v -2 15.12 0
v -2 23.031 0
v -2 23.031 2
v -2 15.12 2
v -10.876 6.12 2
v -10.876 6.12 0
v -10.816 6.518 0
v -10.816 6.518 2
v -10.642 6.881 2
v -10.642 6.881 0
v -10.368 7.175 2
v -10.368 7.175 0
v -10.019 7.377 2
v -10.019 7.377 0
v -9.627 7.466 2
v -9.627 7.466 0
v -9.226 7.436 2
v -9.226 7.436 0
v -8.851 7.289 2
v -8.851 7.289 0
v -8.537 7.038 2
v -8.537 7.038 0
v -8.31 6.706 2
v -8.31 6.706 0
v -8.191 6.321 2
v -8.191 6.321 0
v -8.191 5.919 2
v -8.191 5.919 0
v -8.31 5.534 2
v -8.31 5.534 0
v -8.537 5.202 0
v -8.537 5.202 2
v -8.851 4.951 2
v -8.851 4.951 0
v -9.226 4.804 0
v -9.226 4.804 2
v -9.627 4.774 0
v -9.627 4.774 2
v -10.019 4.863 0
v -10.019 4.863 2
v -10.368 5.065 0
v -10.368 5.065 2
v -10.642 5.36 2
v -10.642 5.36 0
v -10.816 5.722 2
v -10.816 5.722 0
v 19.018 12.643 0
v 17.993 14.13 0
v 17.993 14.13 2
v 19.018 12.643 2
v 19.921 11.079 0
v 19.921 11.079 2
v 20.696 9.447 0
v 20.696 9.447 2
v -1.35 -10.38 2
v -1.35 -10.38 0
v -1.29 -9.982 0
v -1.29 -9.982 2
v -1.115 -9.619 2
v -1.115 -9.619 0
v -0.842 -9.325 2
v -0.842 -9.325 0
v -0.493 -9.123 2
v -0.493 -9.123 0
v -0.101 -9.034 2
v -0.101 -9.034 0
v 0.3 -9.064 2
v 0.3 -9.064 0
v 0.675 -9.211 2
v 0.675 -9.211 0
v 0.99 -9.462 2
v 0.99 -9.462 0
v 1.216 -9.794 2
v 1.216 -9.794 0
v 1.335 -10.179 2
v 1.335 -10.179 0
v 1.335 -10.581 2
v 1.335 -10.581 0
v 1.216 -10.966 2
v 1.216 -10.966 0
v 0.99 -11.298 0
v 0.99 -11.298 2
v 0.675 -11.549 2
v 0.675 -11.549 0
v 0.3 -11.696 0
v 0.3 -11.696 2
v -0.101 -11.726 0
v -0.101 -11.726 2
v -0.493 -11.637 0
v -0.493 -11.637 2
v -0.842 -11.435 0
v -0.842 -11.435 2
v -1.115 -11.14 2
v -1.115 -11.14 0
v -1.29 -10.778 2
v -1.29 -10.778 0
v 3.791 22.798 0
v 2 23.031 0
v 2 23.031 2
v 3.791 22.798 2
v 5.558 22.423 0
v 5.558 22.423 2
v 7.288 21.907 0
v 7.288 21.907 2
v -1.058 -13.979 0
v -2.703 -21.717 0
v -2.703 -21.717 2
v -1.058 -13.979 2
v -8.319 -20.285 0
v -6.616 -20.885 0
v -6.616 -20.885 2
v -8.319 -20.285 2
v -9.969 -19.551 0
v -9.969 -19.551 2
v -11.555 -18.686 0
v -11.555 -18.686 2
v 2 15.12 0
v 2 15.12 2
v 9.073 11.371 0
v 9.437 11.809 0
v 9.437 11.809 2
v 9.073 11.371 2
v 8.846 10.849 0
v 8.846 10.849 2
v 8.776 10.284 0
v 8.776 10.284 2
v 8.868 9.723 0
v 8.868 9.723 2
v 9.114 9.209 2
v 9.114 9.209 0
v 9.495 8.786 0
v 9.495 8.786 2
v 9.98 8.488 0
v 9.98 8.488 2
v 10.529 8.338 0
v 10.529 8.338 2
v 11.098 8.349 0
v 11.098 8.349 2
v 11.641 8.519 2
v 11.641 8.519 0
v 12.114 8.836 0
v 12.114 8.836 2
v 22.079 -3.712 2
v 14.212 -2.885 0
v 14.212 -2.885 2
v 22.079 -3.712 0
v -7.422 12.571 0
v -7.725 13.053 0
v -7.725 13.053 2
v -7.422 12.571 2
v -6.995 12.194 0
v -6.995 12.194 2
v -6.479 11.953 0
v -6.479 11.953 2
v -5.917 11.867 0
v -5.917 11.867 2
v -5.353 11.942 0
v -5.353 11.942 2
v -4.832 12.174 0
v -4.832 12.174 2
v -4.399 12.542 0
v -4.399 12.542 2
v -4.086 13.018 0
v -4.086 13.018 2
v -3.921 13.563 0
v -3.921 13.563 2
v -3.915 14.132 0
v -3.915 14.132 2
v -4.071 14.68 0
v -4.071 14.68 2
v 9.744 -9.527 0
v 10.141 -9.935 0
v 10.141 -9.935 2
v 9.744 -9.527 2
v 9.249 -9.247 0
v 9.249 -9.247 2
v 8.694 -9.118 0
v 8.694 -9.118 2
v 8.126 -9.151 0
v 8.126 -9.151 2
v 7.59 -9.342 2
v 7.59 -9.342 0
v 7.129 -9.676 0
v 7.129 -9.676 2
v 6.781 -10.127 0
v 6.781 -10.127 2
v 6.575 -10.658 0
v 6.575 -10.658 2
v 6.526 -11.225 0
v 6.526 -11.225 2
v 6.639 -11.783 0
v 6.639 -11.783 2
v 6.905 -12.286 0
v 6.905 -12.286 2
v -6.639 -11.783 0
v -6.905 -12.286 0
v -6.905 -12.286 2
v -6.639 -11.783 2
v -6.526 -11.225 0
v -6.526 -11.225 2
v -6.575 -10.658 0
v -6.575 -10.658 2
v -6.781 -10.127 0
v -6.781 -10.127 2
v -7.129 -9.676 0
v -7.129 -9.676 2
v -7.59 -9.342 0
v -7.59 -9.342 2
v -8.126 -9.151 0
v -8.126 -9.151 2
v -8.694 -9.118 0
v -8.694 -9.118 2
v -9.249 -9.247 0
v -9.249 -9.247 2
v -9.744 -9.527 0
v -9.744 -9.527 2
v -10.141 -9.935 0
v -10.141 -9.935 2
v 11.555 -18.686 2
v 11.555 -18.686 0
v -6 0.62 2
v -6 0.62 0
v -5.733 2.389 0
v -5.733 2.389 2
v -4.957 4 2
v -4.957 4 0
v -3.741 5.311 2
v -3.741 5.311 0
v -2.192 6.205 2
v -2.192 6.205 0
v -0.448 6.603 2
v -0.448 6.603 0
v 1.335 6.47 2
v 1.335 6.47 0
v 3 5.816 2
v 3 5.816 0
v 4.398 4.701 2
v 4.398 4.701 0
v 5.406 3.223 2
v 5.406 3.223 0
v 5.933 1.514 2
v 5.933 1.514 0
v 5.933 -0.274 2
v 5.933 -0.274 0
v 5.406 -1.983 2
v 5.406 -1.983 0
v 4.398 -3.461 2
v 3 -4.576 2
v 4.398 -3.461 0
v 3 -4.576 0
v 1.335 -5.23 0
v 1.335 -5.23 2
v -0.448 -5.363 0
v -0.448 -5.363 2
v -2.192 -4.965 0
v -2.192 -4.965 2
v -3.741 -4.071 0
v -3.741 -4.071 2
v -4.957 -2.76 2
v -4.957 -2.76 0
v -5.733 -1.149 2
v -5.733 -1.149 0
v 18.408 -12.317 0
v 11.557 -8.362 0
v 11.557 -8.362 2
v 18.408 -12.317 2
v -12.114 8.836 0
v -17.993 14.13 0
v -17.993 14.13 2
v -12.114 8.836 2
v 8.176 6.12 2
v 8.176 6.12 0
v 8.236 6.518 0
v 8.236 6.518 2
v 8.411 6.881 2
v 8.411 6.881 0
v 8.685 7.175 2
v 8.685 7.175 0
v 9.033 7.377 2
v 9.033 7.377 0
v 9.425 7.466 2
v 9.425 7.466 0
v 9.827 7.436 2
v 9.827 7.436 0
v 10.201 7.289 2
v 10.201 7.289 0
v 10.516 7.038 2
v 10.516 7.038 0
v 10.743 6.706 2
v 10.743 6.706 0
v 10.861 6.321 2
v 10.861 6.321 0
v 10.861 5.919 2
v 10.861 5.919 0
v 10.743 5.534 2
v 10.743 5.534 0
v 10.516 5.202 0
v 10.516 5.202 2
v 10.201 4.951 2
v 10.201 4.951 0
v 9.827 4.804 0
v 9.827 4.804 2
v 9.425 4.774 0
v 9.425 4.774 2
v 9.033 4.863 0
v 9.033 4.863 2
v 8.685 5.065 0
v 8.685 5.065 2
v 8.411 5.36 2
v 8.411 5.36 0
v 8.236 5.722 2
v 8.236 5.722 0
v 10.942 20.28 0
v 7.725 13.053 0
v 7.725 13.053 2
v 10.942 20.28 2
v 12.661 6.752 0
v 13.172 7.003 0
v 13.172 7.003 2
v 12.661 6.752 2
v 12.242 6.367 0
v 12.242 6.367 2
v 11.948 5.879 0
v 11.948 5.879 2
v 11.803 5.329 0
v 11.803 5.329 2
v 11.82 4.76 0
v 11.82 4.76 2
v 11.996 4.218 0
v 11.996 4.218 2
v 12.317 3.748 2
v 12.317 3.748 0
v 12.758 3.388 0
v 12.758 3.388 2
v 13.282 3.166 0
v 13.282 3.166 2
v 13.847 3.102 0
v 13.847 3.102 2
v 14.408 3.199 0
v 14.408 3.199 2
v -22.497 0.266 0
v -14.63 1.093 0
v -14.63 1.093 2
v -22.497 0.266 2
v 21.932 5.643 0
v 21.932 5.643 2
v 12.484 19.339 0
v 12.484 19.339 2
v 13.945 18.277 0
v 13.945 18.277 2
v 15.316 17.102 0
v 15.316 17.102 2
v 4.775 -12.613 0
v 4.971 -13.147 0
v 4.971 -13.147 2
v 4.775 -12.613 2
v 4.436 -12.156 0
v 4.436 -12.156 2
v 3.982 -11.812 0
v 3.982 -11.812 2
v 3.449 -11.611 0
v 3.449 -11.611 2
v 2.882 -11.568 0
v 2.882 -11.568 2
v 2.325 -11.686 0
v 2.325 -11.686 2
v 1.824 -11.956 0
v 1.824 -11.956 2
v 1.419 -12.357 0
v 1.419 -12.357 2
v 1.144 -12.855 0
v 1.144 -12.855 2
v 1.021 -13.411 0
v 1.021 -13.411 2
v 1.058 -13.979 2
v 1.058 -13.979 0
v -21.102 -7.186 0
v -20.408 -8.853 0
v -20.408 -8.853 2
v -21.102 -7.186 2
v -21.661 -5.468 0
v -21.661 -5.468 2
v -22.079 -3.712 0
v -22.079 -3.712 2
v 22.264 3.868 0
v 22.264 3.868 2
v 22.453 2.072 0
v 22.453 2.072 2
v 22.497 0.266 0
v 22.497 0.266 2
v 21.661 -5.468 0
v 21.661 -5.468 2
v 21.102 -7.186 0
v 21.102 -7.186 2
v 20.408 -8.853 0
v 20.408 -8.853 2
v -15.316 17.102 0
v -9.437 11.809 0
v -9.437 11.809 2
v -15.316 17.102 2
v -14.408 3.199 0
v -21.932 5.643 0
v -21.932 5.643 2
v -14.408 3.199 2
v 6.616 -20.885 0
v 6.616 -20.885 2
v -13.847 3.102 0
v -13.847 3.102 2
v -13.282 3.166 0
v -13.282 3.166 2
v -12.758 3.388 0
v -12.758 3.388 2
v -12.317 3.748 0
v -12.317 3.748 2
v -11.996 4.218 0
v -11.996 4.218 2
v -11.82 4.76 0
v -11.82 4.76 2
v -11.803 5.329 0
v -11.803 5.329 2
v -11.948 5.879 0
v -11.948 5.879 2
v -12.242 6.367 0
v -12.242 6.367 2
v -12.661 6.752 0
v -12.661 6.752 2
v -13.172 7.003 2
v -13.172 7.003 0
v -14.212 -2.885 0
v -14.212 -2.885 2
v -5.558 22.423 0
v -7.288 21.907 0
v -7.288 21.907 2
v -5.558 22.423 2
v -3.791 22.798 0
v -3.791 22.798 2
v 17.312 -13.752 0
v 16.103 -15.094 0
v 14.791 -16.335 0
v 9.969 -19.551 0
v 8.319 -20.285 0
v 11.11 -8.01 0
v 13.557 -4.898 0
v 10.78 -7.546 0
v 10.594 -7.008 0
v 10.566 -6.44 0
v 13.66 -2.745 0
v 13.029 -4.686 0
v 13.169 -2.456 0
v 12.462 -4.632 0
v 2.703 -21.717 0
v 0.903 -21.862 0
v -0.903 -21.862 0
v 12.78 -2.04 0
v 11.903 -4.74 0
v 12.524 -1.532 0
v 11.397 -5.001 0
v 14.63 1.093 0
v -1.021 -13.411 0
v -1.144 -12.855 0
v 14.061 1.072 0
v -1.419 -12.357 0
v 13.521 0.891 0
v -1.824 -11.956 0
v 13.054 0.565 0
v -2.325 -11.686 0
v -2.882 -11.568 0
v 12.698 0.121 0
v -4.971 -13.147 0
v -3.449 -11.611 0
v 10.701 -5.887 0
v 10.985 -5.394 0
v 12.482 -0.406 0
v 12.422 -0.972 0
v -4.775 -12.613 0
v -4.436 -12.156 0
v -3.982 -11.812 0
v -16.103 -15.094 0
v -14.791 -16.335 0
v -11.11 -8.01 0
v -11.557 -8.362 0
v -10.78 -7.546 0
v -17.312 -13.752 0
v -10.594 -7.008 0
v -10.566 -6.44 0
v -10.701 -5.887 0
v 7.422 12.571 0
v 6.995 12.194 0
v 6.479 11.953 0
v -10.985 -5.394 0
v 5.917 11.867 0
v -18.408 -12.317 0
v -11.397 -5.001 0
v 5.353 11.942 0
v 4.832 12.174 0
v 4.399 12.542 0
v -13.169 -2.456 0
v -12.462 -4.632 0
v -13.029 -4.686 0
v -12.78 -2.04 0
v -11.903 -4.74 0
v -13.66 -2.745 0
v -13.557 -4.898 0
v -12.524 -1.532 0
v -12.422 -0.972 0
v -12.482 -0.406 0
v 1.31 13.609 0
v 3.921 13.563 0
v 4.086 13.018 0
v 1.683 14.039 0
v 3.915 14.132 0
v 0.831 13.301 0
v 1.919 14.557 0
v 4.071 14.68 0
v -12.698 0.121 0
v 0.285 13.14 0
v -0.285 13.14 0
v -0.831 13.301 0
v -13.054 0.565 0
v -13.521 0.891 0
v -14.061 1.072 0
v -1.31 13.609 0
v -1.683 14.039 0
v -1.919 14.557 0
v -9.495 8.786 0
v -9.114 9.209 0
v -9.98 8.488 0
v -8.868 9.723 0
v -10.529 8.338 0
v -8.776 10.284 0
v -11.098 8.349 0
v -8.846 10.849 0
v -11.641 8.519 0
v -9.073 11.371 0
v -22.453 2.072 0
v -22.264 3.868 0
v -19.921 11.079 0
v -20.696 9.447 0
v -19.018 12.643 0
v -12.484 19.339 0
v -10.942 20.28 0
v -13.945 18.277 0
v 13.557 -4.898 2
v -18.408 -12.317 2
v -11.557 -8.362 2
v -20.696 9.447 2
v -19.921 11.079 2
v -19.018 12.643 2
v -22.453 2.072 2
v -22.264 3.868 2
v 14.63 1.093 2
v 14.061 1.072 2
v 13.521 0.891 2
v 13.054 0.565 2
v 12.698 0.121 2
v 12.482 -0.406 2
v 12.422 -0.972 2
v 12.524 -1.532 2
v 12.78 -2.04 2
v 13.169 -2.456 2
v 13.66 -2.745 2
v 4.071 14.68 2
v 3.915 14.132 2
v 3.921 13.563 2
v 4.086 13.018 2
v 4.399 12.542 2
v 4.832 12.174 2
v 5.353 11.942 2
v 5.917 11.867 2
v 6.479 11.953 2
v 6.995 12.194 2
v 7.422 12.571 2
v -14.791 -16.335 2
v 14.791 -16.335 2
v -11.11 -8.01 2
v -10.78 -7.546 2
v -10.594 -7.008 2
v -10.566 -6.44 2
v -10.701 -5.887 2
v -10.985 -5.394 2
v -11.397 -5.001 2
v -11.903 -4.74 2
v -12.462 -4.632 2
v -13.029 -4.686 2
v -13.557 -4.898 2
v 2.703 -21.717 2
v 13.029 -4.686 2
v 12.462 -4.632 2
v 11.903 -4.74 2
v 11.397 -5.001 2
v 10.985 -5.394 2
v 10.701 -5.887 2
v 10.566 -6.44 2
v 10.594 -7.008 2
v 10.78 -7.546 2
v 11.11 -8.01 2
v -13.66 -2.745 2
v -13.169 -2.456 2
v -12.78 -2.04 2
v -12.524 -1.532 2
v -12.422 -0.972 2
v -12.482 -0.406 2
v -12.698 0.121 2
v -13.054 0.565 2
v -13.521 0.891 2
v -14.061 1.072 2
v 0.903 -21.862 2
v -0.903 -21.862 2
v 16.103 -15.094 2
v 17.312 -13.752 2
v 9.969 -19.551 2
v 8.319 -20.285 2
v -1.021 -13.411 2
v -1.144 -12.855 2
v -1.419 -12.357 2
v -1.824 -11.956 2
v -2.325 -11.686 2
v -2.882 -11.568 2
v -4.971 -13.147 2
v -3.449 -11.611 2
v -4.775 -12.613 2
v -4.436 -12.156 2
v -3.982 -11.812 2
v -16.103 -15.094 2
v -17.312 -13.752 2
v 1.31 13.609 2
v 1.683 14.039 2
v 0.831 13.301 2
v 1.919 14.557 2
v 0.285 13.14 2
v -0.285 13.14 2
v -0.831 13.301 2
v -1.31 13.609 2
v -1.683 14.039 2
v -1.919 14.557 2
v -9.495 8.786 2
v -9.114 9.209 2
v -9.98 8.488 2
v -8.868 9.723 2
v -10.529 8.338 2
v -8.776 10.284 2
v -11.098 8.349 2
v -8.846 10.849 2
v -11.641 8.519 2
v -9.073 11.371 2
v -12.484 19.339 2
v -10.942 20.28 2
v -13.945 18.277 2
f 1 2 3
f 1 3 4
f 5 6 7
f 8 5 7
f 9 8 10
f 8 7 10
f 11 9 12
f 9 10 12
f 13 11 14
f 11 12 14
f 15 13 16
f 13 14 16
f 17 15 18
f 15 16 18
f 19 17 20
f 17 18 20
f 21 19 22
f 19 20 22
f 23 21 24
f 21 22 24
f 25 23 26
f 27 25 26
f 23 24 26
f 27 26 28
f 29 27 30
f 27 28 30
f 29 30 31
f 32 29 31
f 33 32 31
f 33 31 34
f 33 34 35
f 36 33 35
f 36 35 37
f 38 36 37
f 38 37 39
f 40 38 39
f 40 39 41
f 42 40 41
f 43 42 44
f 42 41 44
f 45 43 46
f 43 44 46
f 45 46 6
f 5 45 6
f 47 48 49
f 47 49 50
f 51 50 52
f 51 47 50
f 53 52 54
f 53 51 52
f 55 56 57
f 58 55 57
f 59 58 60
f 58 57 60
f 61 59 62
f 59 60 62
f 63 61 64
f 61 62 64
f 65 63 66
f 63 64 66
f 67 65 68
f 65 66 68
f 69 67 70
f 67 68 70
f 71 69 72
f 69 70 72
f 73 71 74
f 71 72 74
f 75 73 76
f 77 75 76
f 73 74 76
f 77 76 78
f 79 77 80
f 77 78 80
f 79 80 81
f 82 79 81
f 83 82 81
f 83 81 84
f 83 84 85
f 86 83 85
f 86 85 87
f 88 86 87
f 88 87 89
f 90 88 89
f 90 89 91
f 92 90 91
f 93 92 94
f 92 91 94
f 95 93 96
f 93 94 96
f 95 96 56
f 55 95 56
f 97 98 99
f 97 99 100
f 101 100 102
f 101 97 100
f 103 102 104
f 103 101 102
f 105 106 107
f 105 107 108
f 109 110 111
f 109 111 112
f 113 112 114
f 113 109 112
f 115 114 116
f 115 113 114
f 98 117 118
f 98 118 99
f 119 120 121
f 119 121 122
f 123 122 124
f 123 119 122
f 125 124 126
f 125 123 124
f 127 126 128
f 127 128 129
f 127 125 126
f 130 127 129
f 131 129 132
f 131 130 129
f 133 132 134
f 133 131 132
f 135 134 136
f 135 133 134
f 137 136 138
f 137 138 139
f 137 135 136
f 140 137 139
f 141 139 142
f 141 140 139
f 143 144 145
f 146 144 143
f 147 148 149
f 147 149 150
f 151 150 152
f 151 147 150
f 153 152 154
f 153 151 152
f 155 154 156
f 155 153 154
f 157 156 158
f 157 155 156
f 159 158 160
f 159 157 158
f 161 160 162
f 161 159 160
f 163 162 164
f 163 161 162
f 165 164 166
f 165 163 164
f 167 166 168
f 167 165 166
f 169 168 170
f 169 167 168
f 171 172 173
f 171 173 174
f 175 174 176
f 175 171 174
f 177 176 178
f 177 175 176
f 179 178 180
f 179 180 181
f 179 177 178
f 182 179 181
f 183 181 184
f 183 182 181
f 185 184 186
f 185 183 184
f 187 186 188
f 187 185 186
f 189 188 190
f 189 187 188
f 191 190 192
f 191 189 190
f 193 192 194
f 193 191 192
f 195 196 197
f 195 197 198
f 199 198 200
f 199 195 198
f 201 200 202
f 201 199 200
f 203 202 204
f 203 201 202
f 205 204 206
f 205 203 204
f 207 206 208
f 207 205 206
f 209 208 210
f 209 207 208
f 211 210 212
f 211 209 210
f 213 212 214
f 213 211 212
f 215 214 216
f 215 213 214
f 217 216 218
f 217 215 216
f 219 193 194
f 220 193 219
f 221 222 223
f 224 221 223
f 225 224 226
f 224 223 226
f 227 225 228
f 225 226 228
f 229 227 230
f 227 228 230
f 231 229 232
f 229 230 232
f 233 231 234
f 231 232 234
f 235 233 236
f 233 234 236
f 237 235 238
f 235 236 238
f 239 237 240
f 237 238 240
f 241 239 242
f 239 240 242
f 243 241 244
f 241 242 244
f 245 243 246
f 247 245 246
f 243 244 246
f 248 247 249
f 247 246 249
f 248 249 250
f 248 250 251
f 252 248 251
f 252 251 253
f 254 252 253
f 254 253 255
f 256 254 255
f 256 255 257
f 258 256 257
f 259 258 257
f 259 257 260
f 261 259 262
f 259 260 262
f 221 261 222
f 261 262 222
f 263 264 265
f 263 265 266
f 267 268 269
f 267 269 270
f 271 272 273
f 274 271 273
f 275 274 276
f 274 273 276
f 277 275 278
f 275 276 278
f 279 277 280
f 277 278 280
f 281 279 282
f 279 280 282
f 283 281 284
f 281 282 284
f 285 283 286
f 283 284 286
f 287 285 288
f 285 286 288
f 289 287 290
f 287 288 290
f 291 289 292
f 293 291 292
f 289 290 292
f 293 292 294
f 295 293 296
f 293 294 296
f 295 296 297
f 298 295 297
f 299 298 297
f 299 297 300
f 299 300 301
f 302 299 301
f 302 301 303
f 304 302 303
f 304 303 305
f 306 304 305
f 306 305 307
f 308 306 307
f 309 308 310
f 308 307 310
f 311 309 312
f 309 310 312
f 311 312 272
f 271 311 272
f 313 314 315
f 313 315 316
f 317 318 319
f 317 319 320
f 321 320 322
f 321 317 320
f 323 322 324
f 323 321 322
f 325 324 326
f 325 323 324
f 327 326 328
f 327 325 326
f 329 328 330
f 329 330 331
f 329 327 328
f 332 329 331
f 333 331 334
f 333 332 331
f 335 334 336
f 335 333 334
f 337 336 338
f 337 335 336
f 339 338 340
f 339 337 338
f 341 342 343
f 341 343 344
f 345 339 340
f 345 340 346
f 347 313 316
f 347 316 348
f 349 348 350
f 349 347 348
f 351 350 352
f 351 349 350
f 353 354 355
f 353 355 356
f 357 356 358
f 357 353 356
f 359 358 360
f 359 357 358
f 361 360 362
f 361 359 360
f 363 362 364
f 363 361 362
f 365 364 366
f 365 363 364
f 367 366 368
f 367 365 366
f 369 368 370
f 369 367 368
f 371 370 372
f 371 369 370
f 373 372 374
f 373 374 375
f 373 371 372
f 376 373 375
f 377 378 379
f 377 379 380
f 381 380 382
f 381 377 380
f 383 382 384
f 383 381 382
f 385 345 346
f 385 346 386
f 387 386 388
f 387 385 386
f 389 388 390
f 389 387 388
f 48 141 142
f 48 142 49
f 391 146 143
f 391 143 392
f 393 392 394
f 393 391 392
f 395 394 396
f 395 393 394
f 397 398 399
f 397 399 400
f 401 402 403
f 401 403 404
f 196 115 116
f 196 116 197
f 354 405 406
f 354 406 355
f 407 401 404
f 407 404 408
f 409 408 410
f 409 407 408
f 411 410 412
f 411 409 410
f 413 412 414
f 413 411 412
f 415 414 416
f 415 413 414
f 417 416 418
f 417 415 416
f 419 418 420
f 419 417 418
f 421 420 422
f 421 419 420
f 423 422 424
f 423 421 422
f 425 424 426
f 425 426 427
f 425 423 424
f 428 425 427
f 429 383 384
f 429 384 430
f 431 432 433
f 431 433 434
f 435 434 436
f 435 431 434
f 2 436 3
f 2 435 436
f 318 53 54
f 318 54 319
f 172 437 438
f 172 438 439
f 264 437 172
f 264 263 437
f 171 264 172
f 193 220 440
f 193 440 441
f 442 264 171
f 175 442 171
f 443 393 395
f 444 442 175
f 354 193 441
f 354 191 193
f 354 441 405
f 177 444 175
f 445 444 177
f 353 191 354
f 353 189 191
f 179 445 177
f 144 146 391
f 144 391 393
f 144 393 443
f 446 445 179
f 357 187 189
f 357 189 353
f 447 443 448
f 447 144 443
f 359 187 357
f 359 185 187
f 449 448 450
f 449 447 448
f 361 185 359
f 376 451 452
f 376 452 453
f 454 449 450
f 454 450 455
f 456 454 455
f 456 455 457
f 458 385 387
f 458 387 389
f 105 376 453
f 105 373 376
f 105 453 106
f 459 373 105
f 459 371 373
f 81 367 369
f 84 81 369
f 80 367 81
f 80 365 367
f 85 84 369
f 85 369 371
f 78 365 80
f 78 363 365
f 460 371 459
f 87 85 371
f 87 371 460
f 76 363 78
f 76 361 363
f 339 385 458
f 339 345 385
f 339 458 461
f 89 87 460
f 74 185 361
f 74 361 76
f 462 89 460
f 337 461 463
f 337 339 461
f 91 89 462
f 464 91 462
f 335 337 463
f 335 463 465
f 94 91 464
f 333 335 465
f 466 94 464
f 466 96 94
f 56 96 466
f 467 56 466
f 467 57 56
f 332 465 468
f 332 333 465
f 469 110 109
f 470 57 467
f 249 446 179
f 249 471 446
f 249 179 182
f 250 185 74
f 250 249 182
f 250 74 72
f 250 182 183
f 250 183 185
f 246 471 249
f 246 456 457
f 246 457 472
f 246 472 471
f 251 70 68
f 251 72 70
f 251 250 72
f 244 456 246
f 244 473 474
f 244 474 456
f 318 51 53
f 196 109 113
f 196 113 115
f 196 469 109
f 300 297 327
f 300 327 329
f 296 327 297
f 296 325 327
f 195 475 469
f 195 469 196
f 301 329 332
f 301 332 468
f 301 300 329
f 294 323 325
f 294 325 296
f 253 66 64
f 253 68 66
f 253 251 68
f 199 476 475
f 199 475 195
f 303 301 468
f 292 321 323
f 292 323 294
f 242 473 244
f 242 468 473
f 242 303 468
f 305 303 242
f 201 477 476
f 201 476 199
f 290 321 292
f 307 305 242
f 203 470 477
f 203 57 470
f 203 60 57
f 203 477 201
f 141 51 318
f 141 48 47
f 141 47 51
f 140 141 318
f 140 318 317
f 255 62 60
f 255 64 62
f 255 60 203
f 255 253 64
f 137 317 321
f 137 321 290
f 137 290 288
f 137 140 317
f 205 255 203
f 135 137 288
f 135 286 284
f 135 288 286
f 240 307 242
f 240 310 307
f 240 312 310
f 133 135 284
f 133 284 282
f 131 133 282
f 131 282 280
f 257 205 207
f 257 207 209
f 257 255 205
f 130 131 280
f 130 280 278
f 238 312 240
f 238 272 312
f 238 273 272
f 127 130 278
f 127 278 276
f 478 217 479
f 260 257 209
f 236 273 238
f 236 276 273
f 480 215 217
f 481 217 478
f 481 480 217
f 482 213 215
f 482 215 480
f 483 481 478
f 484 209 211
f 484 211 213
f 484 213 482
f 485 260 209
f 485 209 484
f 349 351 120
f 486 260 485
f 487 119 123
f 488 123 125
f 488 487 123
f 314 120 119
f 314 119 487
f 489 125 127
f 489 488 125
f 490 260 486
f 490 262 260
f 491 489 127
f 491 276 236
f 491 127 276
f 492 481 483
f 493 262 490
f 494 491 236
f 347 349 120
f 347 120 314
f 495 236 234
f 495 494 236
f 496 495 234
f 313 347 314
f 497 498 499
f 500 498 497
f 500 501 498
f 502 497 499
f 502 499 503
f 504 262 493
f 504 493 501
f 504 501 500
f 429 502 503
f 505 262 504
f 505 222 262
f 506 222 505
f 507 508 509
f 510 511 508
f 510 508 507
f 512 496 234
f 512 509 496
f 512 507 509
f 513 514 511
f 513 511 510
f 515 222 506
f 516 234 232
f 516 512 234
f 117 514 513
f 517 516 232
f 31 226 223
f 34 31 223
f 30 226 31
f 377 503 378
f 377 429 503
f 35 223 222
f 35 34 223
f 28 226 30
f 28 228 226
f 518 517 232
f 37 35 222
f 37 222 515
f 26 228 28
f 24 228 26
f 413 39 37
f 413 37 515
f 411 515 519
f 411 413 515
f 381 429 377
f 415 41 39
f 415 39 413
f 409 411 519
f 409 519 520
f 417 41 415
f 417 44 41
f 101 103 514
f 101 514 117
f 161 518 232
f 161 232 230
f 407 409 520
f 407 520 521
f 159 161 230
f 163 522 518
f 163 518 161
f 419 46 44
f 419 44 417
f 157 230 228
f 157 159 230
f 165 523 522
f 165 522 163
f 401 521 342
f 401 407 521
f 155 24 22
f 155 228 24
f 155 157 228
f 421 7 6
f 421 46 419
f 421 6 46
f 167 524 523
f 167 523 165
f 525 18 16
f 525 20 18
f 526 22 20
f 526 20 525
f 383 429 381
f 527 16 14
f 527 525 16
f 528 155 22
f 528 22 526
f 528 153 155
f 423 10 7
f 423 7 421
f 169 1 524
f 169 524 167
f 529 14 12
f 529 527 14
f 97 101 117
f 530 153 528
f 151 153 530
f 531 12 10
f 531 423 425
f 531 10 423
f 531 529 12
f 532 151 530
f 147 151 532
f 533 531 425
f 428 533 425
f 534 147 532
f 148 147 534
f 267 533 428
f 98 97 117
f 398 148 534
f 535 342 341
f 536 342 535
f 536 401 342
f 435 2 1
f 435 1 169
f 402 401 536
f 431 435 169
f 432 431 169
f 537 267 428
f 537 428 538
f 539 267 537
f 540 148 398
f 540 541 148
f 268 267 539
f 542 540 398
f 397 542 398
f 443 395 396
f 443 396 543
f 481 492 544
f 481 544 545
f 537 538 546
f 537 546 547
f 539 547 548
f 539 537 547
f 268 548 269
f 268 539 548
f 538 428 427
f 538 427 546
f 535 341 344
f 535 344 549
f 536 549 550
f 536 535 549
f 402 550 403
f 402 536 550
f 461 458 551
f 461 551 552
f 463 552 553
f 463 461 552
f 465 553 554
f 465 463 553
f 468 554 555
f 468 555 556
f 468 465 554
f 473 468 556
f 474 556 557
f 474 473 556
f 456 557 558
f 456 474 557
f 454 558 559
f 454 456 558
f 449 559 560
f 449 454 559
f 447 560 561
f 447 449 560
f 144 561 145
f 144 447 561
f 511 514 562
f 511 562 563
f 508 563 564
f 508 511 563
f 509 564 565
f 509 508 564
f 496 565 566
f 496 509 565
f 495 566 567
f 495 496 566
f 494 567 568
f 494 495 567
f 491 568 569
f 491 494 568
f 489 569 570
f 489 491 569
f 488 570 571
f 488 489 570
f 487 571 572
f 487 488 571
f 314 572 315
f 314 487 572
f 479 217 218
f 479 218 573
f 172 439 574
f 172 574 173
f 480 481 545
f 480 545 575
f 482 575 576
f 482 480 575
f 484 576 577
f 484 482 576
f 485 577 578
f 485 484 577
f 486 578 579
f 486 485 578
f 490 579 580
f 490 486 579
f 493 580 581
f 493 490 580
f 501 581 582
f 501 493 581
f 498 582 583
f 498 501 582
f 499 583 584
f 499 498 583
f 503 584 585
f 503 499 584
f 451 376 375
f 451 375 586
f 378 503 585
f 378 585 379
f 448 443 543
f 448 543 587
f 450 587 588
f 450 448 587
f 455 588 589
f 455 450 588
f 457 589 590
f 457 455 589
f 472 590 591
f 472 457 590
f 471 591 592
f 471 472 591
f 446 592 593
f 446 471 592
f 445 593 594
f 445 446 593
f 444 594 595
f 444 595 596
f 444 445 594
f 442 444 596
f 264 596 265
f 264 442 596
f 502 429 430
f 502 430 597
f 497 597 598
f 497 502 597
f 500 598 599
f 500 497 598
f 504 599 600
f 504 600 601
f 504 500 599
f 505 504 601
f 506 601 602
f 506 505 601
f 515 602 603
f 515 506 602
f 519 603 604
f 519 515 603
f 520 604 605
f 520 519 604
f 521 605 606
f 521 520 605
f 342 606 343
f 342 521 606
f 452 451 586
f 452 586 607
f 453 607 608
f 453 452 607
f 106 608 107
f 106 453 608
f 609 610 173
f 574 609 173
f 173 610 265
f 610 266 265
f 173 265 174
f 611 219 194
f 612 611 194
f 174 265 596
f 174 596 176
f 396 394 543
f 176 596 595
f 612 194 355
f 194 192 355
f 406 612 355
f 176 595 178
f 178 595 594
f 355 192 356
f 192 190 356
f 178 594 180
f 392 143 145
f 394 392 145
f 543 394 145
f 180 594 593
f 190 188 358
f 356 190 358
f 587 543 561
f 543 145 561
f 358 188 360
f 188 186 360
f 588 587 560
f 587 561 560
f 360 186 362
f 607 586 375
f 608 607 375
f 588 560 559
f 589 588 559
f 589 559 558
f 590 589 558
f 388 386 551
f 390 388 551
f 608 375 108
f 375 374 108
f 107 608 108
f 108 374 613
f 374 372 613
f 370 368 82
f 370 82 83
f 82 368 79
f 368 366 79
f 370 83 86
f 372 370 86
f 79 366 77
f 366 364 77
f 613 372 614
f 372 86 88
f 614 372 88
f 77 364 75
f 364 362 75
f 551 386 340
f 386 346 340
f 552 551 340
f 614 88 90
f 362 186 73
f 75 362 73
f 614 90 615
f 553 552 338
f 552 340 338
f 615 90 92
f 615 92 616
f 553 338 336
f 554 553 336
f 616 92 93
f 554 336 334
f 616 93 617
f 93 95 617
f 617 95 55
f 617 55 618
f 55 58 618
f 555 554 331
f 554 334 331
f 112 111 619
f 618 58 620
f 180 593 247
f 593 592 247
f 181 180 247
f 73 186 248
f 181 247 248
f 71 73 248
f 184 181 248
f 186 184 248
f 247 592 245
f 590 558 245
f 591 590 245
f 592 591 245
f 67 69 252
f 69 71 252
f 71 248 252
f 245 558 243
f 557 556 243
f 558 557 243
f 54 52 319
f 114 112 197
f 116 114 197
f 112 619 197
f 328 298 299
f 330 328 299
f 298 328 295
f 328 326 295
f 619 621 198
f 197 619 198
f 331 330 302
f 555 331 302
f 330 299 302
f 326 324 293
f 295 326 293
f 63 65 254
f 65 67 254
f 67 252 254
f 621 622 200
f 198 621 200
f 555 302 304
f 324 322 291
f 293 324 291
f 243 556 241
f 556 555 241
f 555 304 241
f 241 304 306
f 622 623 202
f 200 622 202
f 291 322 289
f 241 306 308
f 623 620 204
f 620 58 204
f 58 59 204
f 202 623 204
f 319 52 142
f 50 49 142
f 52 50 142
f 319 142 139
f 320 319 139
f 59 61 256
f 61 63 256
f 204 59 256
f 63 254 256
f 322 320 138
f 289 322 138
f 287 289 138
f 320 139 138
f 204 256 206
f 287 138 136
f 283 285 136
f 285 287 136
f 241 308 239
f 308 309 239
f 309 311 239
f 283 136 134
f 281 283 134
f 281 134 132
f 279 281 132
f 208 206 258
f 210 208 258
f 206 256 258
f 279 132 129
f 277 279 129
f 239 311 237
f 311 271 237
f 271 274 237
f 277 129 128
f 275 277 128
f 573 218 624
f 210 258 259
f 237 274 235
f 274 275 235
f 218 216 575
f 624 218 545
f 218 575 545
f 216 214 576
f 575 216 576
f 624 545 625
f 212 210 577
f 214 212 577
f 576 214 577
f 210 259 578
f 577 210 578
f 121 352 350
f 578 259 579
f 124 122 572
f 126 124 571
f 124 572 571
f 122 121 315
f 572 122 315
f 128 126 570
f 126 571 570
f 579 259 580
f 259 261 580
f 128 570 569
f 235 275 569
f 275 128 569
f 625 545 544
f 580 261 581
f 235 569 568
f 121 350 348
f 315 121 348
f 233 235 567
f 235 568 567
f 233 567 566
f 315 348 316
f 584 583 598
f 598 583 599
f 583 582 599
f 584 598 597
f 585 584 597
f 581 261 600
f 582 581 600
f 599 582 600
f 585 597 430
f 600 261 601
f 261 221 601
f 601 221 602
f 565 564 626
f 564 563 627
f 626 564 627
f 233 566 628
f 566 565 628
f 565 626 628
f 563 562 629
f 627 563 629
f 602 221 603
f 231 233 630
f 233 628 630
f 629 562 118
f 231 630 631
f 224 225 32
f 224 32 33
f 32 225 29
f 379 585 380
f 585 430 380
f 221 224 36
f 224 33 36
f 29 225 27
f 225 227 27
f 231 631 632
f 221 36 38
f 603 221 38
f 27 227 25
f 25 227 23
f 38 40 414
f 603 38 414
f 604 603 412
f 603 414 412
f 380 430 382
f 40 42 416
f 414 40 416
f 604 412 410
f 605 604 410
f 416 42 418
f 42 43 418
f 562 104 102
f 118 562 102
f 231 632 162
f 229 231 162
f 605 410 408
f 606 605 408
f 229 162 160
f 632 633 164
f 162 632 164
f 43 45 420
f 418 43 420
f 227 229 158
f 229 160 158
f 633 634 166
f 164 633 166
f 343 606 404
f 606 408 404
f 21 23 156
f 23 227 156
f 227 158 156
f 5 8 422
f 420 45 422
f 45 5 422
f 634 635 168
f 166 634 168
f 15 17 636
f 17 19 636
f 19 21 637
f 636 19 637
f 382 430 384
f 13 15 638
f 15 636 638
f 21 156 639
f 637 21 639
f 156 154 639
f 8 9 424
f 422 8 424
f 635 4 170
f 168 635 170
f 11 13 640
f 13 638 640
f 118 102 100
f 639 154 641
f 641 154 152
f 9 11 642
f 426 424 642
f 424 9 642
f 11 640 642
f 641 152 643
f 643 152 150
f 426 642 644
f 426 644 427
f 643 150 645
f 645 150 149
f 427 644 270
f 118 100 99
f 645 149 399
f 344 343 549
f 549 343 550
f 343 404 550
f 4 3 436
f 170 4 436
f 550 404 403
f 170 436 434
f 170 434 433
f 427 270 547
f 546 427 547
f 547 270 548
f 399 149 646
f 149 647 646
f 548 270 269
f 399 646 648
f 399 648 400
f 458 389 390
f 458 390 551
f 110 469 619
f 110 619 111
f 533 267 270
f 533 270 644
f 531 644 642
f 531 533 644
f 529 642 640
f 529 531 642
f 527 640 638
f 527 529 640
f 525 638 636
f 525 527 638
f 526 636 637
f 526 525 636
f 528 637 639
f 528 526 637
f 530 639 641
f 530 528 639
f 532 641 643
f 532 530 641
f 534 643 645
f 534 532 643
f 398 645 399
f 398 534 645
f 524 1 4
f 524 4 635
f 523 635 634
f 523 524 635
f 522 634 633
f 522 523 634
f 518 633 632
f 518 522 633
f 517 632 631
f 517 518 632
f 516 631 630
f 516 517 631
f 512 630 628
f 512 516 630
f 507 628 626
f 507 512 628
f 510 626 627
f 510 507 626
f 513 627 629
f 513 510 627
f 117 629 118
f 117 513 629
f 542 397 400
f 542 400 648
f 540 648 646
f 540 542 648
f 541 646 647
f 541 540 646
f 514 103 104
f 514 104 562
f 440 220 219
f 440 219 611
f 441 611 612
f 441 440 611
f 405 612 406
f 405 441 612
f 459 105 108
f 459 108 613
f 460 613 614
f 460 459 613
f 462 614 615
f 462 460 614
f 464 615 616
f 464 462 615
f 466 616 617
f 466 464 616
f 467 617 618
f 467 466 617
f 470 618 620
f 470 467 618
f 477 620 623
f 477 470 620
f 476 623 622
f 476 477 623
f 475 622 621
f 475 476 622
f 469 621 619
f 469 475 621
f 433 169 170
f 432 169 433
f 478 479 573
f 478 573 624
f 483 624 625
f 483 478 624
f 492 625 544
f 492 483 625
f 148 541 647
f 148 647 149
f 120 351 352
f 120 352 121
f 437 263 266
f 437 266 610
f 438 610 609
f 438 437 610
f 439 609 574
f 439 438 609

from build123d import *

# Parameters (mm, degrees)
SKETCH1_R           = 1.35
SKETCH1_R_2         = 6
BOSS_EXTRUDE1_DEPTH = 2


with BuildPart() as part:
    # Sketch1 → Boss-Extrude1 (new body)
    with BuildSketch(Plane(origin=(0, 0, 0), x_dir=(-1, 0, 0), z_dir=(0, 0, -1))):
        with BuildLine():
            Line((-15.316309042, 17.102154929), (-9.437338757, 11.808706309))
            ThreePointArc((-9.437338757, 11.808706309), (-9.289310319, 8.984155445), (-12.113861182, 8.836127007))
            Line((-12.113861182, 8.836127007), (-17.992831467, 14.129575627))
            ThreePointArc((-17.992831467, 14.129575627), (-19.485571585, 11.870022867), (-20.696031618, 9.447495623))
            Line((-20.696031618, 9.447495623), (-13.172285497, 7.002882316))
            ThreePointArc((-13.172285497, 7.002882316), (-11.888206454, 4.482735294), (-14.408353475, 3.198656251))
            Line((-14.408353475, 3.198656251), (-21.932099596, 5.643269556))
            ThreePointArc((-21.932099596, 5.643269556), (-22.376742646, 2.971913289), (-22.497222312, 0.266486078))
            Line((-22.497222312, 0.266486078), (-14.62962441, 1.093403939))
            ThreePointArc((-14.62962441, 1.093403939), (-12.431523692, -0.686582926), (-14.211510557, -2.884683643))
            Line((-14.211510557, -2.884683643), (-22.079108459, -3.711601503))
            ThreePointArc((-22.079108459, -3.711601503), (-21.398771617, -6.332859507), (-20.408438887, -8.853393742))
            Line((-20.408438887, -8.853393742), (-13.557368355, -4.897926326))
            ThreePointArc((-13.557368355, -4.897926326), (-10.825317547, -5.629977134), (-11.557368355, -8.362027942))
            Line((-11.557368355, -8.362027942), (-18.408438886, -12.317495358))
            ThreePointArc((-18.408438886, -12.317495358), (-16.720758571, -14.435415779), (-14.790850969, -16.335233771))
            Line((-14.790850969, -16.335233771), (-10.140920148, -9.935153049))
            ThreePointArc((-10.140920148, -9.935153049), (-7.347315654, -9.492689564), (-6.90485217, -12.286294058))
            Line((-6.90485217, -12.286294058), (-11.554782995, -18.686374777))
            ThreePointArc((-11.554782995, -18.686374777), (-9.151574469, -19.934749931), (-6.615790555, -20.885355888))
            Line((-6.615790555, -20.885355888), (-4.971014718, -13.147293963))
            ThreePointArc((-4.971014718, -13.147293963), (-2.598896135, -11.606822144), (-1.058424316, -13.978940727))
            Line((-1.058424316, -13.978940727), (-2.703200152, -21.717002651))
            ThreePointArc((-2.703200152, -21.717002651), (-3e-09, -21.879977134), (2.703200146, -21.717002651))
            Line((2.703200146, -21.717002651), (1.058424314, -13.978940725))
            ThreePointArc((1.058424314, -13.978940725), (2.598896135, -11.606822143), (4.971014718, -13.147293963))
            Line((4.971014718, -13.147293963), (6.615790554, -20.885355888))
            ThreePointArc((6.615790554, -20.885355888), (9.151574469, -19.934749931), (11.554782995, -18.686374777))
            Line((11.554782995, -18.686374777), (6.904852169, -12.286294058))
            ThreePointArc((6.904852169, -12.286294058), (7.347315653, -9.492689564), (10.140920146, -9.935153048))
            Line((10.140920146, -9.935153048), (14.790850972, -16.335233768))
            ThreePointArc((14.790850972, -16.335233768), (16.720758571, -14.435415779), (18.408438883, -12.317495361))
            Line((18.408438883, -12.317495361), (11.557368352, -8.362027946))
            ThreePointArc((11.557368352, -8.362027946), (10.825317543, -5.629977135), (13.557368354, -4.897926327))
            Line((13.557368354, -4.897926327), (20.408438886, -8.853393742))
            ThreePointArc((20.408438886, -8.853393742), (21.398771616, -6.332859507), (22.079108458, -3.711601502))
            Line((22.079108458, -3.711601502), (14.211510556, -2.884683643))
            ThreePointArc((14.211510556, -2.884683643), (12.431523691, -0.686582926), (14.629624409, 1.093403939))
            Line((14.629624409, 1.093403939), (22.497222311, 0.266486078))
            ThreePointArc((22.497222311, 0.266486078), (22.376742645, 2.971913287), (21.932099596, 5.643269552))
            Line((21.932099596, 5.643269552), (14.408353473, 3.19865625))
            ThreePointArc((14.408353473, 3.19865625), (11.888206452, 4.482735295), (13.172285497, 7.002882316))
            Line((13.172285497, 7.002882316), (20.696031618, 9.447495621))
            ThreePointArc((20.696031618, 9.447495621), (19.485571584, 11.870022866), (17.992831465, 14.129575628))
            Line((17.992831465, 14.129575628), (12.113861182, 8.836127007))
            ThreePointArc((12.113861182, 8.836127007), (9.289310318, 8.984155445), (9.437338756, 11.808706308))
            Line((9.437338756, 11.808706308), (15.316309041, 17.102154929))
            ThreePointArc((15.316309041, 17.102154929), (13.225168178, 18.822905238), (10.94243932, 20.279957294))
            Line((10.94243932, 20.279957294), (7.724772239, 13.052958714))
            ThreePointArc((7.724772239, 13.052958714), (5.084208037, 12.039341086), (4.070590408, 14.679905287))
            Line((4.070590408, 14.679905287), (7.288257486, 21.906903868))
            ThreePointArc((7.288257486, 21.906903868), (4.67801304, 22.628343883), (1.999999993, 23.030957697))
            Line((1.999999993, 23.030957697), (1.999999993, 15.120022866))
            ThreePointArc((1.999999993, 15.120022866), (-1e-09, 13.120022872), (-1.999999995, 15.120022866))
            Line((-1.999999995, 15.120022866), (-1.999999995, 23.030957697))
            ThreePointArc((-1.999999995, 23.030957697), (-4.67801304, 22.628343883), (-7.288257483, 21.906903869))
            Line((-7.288257483, 21.906903869), (-4.070590409, 14.679905287))
            ThreePointArc((-4.070590409, 14.679905287), (-5.084208039, 12.039341085), (-7.72477224, 13.052958715))
            Line((-7.72477224, 13.052958715), (-10.942439317, 20.279957296))
            ThreePointArc((-10.942439317, 20.279957296), (-13.225168177, 18.822905239), (-15.316309042, 17.102154929))
        make_face()
        with Locations((9.526279442, 6.120022866)):
            Circle(SKETCH1_R, mode=Mode.SUBTRACT)
        with Locations((-9.526279442, 6.120022866)):
            Circle(SKETCH1_R, mode=Mode.SUBTRACT)
        with Locations((0, -10.379977134)):
            Circle(SKETCH1_R, mode=Mode.SUBTRACT)
        with Locations((0, 0.620022866)):
            Circle(SKETCH1_R_2, mode=Mode.SUBTRACT)
    extrude(amount=-BOSS_EXTRUDE1_DEPTH)


solid = part.part
